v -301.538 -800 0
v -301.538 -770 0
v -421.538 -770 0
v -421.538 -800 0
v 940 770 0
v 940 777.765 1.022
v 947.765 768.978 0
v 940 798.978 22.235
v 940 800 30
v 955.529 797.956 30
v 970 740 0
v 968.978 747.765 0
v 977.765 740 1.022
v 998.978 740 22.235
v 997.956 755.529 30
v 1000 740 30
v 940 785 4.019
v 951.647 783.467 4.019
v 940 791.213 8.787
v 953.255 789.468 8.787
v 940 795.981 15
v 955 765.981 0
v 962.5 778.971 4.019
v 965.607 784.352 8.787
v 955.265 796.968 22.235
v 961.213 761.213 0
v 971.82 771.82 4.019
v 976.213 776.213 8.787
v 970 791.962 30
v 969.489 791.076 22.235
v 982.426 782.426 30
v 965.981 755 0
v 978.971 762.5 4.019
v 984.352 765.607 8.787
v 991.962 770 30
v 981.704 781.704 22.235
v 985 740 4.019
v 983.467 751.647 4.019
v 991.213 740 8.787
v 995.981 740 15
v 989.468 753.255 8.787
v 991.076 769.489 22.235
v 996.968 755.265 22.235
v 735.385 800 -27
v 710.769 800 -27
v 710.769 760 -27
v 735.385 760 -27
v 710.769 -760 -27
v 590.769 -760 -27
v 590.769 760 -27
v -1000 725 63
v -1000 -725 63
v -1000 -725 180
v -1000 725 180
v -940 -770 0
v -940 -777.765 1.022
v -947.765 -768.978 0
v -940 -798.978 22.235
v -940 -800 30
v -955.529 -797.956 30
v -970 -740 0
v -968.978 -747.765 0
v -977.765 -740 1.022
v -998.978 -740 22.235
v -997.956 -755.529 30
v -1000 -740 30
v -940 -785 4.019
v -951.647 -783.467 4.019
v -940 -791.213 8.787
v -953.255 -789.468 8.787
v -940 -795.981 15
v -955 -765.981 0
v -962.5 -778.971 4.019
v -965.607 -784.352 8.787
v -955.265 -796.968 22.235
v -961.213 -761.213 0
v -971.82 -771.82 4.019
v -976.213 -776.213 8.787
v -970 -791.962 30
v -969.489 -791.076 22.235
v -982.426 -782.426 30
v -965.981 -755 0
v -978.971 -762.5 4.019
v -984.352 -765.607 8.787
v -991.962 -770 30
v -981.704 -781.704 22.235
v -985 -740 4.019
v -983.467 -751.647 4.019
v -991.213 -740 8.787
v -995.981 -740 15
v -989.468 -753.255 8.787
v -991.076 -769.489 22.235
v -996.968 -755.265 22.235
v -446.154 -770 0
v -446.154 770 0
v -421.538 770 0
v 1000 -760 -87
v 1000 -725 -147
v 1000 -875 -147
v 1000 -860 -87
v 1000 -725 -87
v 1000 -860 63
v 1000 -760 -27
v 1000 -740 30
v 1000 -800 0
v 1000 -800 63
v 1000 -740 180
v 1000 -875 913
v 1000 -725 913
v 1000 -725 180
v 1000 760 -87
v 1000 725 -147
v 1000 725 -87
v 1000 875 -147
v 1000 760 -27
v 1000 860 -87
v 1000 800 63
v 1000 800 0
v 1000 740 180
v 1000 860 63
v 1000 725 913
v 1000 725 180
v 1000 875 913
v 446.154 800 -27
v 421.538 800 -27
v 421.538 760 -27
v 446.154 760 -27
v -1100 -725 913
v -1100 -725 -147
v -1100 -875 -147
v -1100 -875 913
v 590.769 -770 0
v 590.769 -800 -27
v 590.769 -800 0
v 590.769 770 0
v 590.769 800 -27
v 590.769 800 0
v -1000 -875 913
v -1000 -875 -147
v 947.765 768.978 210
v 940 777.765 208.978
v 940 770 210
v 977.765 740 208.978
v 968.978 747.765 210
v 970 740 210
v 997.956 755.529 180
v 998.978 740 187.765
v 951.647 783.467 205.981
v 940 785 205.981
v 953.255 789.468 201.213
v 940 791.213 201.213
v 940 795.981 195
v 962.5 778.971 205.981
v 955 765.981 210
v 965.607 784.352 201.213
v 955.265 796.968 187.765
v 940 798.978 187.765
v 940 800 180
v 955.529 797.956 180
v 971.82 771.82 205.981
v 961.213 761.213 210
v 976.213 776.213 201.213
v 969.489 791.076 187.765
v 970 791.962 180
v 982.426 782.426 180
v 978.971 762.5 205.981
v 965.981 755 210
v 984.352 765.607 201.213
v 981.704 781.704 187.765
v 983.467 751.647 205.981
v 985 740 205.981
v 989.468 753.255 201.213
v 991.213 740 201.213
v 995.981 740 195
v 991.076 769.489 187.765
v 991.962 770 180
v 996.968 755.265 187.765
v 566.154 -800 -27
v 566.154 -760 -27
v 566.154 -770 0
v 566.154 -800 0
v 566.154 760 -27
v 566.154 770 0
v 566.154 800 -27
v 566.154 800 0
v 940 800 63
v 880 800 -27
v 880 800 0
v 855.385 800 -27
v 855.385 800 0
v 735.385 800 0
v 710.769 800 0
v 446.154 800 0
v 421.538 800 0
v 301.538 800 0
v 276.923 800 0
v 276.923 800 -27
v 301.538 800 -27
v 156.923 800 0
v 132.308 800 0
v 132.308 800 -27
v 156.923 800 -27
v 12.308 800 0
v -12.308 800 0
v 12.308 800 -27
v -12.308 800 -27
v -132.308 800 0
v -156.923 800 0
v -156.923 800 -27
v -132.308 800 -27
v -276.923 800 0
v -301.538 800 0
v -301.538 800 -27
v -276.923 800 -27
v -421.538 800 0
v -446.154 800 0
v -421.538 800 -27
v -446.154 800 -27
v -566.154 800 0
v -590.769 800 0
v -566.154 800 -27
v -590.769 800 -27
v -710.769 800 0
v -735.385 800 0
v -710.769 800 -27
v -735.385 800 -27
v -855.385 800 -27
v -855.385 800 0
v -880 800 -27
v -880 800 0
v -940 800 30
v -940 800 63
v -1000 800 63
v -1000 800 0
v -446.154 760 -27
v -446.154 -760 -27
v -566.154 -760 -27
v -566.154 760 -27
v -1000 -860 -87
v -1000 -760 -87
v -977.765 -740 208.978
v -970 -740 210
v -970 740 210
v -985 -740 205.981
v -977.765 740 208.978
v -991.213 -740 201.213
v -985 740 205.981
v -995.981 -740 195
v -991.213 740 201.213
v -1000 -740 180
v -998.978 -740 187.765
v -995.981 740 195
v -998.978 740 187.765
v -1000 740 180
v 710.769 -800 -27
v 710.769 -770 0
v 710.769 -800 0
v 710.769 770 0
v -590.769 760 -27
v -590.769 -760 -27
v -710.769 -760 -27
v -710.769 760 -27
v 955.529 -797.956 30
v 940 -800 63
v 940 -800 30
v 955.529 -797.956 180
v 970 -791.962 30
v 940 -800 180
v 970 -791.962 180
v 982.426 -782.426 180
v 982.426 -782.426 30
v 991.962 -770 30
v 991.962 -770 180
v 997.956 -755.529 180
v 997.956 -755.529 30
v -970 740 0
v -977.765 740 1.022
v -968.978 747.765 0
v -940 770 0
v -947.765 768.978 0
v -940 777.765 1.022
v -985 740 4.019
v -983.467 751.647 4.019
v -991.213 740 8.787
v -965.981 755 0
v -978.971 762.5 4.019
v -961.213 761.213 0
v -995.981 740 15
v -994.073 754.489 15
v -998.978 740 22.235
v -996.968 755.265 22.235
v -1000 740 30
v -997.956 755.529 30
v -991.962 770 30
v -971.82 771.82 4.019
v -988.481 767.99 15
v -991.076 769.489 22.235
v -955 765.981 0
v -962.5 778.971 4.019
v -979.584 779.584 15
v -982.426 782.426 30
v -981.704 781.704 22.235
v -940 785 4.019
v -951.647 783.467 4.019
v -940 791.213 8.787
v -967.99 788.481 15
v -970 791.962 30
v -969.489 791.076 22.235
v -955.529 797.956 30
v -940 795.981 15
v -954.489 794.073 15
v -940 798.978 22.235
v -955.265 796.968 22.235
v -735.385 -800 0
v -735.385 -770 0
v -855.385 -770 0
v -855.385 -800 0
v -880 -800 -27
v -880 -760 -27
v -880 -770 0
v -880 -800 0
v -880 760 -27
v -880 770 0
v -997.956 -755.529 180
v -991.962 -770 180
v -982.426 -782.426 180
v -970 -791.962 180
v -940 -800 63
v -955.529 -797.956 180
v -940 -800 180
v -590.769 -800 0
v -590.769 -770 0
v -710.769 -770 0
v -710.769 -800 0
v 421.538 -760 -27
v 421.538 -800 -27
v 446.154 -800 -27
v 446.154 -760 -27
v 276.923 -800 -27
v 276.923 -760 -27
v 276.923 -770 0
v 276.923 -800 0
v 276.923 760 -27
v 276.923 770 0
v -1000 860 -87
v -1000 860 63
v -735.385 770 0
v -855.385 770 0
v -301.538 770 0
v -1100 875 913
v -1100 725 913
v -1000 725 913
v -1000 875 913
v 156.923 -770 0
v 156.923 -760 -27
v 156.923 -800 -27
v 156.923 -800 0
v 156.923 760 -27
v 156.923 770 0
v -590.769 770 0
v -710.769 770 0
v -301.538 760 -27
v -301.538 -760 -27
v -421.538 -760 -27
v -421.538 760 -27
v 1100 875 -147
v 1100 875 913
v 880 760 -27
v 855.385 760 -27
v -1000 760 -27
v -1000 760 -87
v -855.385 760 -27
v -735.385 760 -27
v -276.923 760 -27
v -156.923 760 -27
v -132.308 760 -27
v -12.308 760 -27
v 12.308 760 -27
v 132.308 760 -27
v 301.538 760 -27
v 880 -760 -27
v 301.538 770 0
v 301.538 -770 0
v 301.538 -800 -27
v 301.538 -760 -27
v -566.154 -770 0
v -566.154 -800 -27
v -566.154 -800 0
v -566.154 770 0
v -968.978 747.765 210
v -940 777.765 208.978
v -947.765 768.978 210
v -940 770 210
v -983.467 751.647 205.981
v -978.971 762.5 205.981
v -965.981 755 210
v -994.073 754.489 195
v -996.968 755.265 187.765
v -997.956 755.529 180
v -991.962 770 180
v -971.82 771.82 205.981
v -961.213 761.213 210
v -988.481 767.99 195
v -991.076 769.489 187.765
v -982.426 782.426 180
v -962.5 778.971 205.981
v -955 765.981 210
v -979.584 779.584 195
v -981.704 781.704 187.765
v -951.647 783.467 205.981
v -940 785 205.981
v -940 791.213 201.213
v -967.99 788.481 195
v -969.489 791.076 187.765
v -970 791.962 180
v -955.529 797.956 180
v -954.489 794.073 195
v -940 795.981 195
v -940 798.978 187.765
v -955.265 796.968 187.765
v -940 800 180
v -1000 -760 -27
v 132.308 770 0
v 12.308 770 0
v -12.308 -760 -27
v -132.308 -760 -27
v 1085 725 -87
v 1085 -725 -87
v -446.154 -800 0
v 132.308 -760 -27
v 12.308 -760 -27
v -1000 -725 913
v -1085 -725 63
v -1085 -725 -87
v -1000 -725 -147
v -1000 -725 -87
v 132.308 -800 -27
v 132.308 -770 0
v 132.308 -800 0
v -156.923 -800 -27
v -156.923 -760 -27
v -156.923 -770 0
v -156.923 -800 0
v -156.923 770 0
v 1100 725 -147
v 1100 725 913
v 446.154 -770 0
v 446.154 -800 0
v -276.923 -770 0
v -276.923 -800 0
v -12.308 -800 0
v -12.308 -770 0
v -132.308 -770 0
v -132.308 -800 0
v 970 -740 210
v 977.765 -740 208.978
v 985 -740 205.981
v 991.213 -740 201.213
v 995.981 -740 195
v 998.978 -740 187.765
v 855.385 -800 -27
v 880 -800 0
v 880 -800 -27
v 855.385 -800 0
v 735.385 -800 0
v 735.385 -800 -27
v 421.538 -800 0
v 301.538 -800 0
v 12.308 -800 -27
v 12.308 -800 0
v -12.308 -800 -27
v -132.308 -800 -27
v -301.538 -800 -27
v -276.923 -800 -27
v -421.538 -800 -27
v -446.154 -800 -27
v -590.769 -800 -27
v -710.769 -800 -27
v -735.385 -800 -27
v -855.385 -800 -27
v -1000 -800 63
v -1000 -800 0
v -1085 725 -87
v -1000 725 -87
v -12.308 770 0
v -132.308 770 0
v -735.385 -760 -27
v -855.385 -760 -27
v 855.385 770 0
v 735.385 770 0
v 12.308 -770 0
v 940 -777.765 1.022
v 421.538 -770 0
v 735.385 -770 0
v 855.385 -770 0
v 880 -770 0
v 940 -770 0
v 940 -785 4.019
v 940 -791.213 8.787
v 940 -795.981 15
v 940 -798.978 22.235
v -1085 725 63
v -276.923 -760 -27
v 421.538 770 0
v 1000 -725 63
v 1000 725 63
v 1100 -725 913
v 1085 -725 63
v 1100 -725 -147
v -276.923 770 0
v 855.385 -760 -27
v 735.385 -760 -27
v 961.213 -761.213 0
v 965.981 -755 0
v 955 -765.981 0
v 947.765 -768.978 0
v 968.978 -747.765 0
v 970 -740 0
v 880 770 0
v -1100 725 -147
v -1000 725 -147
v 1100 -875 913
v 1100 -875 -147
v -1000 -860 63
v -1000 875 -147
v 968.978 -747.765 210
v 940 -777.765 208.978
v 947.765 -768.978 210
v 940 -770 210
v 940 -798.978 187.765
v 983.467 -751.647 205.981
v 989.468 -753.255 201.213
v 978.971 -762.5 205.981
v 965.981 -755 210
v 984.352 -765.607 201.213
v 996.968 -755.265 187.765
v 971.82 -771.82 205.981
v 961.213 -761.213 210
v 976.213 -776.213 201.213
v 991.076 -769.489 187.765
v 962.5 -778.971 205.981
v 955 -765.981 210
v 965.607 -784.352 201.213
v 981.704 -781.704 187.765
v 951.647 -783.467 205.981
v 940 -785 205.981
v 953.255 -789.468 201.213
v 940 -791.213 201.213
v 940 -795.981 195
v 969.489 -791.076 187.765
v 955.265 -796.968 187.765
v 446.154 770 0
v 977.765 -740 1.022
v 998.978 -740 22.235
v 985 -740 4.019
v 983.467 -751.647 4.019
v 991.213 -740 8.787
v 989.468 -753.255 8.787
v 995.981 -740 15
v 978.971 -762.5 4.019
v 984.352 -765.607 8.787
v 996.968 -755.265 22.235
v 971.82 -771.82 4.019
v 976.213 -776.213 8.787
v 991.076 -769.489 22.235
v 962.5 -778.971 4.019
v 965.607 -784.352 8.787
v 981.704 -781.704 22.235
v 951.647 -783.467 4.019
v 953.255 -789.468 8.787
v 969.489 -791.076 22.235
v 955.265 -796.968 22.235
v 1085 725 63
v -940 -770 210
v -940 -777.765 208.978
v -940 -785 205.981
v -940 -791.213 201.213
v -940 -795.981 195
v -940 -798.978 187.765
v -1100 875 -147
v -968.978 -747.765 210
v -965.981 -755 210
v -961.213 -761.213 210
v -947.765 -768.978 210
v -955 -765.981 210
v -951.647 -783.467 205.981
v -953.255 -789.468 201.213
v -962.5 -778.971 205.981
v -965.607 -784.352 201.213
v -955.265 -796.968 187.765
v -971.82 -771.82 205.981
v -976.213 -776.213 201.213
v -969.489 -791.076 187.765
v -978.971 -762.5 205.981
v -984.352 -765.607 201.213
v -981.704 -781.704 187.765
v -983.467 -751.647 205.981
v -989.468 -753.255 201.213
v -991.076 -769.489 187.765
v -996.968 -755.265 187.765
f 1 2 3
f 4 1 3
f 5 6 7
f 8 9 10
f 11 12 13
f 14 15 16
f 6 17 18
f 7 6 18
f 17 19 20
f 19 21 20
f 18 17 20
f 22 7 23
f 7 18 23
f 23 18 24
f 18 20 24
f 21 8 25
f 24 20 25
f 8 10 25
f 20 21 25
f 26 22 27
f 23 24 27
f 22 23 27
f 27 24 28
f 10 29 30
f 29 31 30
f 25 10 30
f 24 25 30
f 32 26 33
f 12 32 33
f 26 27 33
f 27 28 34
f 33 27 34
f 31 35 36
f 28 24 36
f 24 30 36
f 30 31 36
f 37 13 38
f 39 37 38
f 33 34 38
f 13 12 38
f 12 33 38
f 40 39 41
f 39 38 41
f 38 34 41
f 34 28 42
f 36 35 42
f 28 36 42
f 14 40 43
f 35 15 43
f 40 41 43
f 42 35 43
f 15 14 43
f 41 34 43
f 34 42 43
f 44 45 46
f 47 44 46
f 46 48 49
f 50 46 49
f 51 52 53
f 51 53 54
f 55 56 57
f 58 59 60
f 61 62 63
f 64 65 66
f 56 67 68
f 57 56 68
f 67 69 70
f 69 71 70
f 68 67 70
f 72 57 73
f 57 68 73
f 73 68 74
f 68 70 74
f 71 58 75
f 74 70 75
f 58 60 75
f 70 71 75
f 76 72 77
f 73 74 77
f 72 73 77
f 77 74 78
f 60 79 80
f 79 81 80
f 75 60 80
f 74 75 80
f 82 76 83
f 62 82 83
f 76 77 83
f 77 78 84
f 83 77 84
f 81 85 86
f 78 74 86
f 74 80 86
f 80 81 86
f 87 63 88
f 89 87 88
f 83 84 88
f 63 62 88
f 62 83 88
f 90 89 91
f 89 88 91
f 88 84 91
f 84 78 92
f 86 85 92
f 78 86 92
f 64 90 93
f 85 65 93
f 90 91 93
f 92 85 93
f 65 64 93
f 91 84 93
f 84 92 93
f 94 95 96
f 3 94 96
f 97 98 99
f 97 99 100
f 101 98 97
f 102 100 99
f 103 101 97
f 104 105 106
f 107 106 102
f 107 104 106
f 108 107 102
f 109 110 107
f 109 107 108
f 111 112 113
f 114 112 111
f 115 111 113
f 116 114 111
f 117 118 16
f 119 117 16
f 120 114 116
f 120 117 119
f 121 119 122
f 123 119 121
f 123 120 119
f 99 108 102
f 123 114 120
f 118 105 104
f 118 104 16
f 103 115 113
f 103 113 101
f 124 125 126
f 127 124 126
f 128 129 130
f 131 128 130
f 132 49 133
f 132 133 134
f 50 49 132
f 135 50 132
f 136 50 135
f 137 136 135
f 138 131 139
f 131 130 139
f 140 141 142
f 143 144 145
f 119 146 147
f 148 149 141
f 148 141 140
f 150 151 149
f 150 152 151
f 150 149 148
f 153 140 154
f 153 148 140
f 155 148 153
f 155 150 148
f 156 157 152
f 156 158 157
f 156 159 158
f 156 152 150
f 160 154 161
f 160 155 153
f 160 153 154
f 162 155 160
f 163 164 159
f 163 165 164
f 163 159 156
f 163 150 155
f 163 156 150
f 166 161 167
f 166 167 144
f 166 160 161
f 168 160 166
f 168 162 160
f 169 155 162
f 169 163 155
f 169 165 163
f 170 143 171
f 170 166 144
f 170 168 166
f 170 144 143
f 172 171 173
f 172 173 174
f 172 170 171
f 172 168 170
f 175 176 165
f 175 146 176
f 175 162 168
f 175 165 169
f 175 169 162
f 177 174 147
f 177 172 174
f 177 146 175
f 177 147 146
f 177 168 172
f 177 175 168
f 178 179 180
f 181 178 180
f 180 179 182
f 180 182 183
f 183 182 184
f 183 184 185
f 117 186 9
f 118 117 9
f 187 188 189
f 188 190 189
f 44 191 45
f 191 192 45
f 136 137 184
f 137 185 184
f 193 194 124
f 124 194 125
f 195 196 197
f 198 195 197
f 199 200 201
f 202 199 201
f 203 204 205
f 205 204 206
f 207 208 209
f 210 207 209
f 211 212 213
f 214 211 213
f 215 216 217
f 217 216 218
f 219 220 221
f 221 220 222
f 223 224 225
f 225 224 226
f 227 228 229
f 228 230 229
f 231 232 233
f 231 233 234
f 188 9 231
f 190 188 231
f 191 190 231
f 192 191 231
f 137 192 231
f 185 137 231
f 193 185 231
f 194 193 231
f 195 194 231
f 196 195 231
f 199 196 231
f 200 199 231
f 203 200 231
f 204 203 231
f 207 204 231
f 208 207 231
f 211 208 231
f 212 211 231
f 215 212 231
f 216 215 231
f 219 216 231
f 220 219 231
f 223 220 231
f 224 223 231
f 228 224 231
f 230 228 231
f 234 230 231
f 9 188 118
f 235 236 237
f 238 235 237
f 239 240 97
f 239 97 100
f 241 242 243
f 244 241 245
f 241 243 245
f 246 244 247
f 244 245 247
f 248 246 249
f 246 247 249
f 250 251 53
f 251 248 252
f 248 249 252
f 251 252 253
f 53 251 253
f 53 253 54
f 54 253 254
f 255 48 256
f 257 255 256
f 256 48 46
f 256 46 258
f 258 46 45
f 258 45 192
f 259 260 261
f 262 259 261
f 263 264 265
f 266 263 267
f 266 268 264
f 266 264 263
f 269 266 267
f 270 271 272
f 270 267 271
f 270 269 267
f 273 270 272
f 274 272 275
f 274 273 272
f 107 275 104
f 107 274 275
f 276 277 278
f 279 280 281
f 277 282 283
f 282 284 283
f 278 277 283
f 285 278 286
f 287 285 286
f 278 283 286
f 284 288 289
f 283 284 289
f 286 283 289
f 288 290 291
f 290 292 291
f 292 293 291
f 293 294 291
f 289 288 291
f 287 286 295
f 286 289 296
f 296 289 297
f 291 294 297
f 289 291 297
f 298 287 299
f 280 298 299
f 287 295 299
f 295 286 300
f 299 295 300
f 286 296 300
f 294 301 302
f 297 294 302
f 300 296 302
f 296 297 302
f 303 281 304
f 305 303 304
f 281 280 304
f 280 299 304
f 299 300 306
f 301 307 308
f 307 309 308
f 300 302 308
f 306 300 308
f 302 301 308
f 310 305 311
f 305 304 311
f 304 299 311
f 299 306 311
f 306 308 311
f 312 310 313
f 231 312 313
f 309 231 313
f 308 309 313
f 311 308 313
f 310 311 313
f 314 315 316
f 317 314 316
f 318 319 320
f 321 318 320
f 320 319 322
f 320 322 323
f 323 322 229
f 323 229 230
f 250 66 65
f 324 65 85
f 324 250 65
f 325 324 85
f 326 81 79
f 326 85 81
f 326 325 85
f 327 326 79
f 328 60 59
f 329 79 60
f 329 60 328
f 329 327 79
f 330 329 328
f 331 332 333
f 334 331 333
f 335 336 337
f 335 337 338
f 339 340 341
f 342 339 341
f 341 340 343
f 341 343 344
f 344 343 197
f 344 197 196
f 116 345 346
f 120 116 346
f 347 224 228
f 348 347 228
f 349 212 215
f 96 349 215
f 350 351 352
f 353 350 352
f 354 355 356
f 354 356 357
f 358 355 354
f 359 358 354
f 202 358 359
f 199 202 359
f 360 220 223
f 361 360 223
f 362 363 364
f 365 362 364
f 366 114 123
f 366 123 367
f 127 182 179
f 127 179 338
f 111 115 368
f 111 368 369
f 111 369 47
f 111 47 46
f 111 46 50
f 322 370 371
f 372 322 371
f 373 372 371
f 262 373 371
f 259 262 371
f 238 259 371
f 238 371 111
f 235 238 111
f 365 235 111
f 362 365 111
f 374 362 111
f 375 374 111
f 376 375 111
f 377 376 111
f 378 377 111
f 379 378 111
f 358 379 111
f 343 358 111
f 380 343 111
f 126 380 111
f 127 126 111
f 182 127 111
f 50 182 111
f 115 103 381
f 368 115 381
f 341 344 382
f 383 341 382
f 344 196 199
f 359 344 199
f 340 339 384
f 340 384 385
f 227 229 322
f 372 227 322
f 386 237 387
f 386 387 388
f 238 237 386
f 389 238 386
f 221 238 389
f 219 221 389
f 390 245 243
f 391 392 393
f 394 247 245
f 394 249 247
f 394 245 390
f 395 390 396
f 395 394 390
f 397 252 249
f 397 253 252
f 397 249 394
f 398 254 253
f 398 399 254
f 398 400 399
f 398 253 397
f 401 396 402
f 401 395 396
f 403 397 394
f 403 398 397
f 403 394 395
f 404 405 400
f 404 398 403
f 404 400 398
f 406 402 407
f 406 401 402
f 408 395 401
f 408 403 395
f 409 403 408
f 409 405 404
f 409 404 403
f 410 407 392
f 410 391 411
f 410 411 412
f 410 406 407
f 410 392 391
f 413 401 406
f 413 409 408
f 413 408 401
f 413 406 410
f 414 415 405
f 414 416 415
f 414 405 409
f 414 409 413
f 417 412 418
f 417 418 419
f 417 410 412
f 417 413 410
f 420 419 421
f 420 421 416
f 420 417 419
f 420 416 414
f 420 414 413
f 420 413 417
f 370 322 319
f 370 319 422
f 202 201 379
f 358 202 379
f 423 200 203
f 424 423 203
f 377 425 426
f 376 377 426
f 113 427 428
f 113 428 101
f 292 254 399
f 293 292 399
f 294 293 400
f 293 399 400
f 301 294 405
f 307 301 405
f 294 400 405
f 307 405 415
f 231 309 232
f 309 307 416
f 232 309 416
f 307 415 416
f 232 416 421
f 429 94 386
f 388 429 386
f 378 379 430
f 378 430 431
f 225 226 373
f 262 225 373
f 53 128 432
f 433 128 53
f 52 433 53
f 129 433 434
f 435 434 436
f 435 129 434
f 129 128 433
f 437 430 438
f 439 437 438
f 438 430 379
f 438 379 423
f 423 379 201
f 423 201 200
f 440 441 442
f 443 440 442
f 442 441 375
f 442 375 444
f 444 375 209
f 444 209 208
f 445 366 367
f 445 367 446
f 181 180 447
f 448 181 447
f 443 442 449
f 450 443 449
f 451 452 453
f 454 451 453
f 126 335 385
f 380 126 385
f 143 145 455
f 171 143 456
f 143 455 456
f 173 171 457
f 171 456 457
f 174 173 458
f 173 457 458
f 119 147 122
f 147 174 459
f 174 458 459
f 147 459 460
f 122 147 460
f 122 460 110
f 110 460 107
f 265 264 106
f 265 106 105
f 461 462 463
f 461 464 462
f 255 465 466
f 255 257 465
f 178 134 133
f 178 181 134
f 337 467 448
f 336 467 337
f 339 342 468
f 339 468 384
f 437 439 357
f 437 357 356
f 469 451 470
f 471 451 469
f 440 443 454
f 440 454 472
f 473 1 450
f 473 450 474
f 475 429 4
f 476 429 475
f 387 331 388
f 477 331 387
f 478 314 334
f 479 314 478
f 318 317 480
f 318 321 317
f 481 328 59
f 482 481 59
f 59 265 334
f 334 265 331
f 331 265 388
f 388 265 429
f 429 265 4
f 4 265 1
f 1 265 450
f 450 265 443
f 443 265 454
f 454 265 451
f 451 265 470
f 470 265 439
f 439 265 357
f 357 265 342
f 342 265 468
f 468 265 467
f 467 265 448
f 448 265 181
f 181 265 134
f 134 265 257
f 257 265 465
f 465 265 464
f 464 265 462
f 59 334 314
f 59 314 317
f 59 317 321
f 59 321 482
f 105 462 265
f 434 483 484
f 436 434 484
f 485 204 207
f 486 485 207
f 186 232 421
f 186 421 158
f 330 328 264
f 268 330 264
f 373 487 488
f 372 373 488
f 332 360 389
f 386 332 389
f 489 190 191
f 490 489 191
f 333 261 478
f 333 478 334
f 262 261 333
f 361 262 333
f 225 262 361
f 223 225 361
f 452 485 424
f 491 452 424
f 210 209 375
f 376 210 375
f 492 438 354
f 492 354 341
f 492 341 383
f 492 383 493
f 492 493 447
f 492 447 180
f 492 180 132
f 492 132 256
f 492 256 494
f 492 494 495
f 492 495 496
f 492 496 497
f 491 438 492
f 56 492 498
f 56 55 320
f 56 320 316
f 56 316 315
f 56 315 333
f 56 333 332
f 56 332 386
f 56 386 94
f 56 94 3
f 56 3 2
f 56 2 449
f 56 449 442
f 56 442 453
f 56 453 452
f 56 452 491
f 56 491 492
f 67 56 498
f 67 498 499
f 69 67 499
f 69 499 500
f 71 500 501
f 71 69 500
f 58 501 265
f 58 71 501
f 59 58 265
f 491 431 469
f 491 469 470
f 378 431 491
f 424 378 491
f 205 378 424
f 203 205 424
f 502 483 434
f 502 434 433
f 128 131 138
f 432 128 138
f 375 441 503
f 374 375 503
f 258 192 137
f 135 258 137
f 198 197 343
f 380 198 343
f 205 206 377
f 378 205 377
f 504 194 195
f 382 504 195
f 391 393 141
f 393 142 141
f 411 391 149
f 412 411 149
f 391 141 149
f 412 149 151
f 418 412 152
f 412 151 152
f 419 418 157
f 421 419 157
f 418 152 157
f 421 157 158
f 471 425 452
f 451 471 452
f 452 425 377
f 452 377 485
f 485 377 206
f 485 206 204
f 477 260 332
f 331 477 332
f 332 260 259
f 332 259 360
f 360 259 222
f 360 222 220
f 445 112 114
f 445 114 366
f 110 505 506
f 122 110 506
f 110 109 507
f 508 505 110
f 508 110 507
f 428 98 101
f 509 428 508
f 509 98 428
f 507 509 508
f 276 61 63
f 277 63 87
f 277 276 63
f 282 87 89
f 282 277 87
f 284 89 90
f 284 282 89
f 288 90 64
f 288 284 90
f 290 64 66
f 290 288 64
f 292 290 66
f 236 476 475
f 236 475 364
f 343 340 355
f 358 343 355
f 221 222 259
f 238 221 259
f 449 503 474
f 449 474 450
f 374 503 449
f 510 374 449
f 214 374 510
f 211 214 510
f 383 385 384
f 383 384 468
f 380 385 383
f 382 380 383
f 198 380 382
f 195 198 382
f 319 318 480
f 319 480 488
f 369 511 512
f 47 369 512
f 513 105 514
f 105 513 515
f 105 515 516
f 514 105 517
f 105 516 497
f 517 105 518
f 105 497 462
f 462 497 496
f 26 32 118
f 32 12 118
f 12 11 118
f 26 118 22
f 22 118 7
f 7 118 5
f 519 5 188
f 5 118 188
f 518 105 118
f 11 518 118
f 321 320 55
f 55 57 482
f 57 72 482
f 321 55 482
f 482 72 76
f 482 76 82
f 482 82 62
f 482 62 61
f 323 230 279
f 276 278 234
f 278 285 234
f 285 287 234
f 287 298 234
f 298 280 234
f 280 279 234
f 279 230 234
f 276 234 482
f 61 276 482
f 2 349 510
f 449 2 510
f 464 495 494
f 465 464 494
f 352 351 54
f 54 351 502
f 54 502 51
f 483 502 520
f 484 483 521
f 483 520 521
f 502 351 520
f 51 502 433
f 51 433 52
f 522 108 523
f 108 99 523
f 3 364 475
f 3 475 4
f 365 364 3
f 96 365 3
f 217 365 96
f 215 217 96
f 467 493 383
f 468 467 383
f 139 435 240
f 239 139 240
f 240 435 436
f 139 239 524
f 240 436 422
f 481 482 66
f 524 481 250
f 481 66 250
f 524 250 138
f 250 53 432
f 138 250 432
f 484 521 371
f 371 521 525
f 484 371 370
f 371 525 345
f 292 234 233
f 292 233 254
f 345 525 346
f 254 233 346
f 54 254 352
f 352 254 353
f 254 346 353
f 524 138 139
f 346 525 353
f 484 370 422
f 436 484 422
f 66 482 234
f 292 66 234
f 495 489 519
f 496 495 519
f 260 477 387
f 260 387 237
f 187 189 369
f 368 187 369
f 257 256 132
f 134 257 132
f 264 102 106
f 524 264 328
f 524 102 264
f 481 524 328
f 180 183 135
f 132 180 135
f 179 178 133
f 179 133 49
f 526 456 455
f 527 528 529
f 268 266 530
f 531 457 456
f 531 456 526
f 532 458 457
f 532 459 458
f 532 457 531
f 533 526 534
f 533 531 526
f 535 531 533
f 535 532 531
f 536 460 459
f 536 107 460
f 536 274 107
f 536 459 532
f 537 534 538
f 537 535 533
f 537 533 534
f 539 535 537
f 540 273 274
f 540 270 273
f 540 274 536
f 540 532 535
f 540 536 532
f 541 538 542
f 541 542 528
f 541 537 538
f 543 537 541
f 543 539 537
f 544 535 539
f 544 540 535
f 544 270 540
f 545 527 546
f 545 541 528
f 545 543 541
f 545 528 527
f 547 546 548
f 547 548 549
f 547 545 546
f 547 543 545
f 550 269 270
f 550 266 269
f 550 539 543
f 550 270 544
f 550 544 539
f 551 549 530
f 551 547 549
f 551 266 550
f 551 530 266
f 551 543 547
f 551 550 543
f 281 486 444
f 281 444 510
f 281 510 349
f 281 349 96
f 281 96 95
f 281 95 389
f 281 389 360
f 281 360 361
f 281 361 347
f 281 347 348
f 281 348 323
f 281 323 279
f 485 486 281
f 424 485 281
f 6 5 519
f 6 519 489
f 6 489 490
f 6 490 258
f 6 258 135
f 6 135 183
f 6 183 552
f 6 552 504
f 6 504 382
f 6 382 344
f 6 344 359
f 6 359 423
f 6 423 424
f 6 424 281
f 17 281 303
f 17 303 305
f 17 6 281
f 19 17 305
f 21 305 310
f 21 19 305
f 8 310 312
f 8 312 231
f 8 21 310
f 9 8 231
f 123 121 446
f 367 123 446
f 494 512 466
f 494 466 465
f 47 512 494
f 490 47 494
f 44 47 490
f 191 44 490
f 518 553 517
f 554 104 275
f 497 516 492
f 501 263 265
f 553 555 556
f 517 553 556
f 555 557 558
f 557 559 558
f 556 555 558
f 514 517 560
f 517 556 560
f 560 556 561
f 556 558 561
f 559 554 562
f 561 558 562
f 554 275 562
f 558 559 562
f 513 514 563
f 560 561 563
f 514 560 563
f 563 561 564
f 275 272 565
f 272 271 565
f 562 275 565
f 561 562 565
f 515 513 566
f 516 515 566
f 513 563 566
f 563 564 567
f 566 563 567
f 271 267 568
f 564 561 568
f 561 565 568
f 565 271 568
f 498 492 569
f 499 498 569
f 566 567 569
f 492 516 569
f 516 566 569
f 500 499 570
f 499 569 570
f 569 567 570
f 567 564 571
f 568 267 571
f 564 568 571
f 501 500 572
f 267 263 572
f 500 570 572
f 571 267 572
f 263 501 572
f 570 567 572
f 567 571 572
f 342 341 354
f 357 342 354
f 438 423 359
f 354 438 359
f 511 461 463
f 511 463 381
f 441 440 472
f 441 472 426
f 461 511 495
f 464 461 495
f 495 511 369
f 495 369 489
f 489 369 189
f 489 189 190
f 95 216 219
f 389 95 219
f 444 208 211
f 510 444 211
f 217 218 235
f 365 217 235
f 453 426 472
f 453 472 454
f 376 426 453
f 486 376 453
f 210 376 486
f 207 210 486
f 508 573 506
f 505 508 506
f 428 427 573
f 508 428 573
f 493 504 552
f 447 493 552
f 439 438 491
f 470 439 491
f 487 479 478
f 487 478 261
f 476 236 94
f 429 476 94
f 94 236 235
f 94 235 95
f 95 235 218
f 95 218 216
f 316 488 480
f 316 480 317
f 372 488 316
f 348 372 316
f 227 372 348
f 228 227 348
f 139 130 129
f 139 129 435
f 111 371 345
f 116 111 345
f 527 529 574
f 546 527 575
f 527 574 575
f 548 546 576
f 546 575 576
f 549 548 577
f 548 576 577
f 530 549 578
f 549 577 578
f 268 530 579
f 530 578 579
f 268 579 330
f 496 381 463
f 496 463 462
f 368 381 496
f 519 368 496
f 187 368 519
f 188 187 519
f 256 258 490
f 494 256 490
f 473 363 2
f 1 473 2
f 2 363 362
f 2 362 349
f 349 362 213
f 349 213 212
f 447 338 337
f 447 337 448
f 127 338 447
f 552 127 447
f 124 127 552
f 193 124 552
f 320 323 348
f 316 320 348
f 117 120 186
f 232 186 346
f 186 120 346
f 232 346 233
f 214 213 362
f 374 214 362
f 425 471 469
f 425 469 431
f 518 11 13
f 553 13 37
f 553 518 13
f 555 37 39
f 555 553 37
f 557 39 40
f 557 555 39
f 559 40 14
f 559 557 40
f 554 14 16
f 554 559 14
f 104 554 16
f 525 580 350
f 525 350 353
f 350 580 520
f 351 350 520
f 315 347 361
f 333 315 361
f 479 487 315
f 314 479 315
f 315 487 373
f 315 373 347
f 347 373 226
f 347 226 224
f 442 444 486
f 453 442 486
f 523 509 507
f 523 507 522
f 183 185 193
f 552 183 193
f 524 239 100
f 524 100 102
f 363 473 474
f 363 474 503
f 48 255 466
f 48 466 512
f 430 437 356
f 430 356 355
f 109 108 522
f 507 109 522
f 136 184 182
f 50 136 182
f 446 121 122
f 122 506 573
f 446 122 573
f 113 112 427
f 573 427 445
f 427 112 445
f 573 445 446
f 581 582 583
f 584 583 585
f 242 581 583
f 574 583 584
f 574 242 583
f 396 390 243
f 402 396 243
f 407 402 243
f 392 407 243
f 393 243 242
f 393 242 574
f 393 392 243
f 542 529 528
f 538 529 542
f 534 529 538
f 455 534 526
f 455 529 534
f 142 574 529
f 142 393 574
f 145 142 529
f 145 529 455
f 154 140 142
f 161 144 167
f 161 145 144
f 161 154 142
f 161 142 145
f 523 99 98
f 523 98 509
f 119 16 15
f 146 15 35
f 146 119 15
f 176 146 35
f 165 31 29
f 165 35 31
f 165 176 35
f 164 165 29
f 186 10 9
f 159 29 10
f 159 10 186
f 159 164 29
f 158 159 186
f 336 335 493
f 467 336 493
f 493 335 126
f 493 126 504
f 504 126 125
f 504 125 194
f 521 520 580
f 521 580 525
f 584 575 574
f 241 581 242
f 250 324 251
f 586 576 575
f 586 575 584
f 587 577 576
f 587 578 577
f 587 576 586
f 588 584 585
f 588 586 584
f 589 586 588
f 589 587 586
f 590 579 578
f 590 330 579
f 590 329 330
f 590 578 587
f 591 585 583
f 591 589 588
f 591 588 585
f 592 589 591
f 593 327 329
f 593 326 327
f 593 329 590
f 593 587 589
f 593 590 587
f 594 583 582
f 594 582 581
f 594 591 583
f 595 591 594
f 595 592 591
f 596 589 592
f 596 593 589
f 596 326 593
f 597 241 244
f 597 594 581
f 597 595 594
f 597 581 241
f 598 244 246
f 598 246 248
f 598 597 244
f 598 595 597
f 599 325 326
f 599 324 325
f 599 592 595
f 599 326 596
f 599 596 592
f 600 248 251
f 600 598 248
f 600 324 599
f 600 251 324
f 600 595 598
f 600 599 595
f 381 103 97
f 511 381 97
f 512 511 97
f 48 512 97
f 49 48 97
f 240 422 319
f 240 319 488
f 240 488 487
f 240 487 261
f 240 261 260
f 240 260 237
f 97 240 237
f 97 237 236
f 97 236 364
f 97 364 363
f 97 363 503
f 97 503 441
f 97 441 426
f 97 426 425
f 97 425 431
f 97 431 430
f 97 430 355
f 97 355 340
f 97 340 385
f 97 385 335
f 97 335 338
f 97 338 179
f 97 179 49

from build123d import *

# Parameters (mm, degrees)
SKETCH_W            = 2000
SKETCH_H            = 1600
PAD_DEPTH           = 210
FILLET_R            = 60
FILLET001_R         = 30
FILLET002_R         = 30
SKETCH001_W         = 120
SKETCH001_H         = 27
PAD001_DEPTH        = 1600
LINEARPATTERN_COUNT = 14
LINEARPATTERN_PITCH = 144.615385
PAD002_DEPTH        = 2000
SKETCH003_W         = 100
SKETCH003_H         = 150
PAD003_DEPTH        = 60
PAD003_DEPTH_BACK   = 1000
SKETCH004_W         = 85
SKETCH004_H         = 150
PAD004_DEPTH        = 1450


with BuildPart() as part:
    # Sketch → Pad (new body)
    with BuildSketch(Plane.XY):
        Rectangle(SKETCH_W, SKETCH_H)
    extrude(amount=PAD_DEPTH)

    # Fillet
    fillet_edges = [part.edges().sort_by_distance(p)[0] for p in [
        (1000, 800, 105),
        (1000, -800, 105),
        (-1000, -800, 105),
        (-1000, 800, 105),
    ]]
    fillet(fillet_edges, radius=FILLET_R)

    # Fillet001
    fillet001_edges = [part.edges().sort_by_distance(p)[0] for p in [
        (0, 800, 210),
    ]]
    fillet(fillet001_edges, radius=FILLET001_R)

    # Fillet002
    fillet002_edges = [part.edges().sort_by_distance(p)[0] for p in [
        (0, 800, 0),
    ]]
    fillet(fillet002_edges, radius=FILLET002_R)

    # Sketch001 (on Face1 of Fillet002) → Pad001 (join)
    with BuildSketch(Plane(origin=(0, 800, 0), x_dir=(-1, 0, 0), z_dir=(0, 1, 0))):
        with Locations((-940, -13.5)):
            Rectangle(SKETCH001_W, SKETCH001_H)
    pad001 = extrude(amount=-PAD001_DEPTH)

    # LinearPattern: Pad001 ×14
    with Locations(*[(-i * LINEARPATTERN_PITCH, 0, 0) for i in range(1, LINEARPATTERN_COUNT)]):
        add(pad001)

    # Sketch002 (on Face8 of LinearPattern) → Pad002 (join)
    with BuildSketch(Plane(origin=(-1000, 0, 0), x_dir=(0, -1, 0), z_dir=(-1, 0, 0))):
        Polygon((-860, 63), (-800, 63), (-800, -27), (-760, -27), (-760, -87), (-860, -87), align=None)
    pad002 = extrude(amount=-PAD002_DEPTH)

    # Mirrored: Pad002 across Sketch002 V_Axis
    add(pad002.mirror(Plane(origin=(-1000, 0, 0), x_dir=(-1, 0, 0), z_dir=(0, -1, 0))))

    # Sketch003 (on Face146 of Mirrored) → Pad003 (join, two sides)
    with BuildSketch(Plane(origin=(0, 0, -87), x_dir=(1, 0, 0), z_dir=(0, 0, -1))) as pad003_sk:
        with Locations((-1050, 800)):
            Rectangle(SKETCH003_W, SKETCH003_H)
        with Locations((1050, 800)):
            Rectangle(SKETCH003_W, SKETCH003_H)
        with Locations((1050, -800)):
            Rectangle(SKETCH003_W, SKETCH003_H)
        with Locations((-1050, -800)):
            Rectangle(SKETCH003_W, SKETCH003_H)
    extrude(amount=PAD003_DEPTH)
    extrude(pad003_sk.sketch, amount=-PAD003_DEPTH_BACK)

    # Sketch004 (on Face55 of Pad003) → Pad004 (join)
    with BuildSketch(Plane.XZ.offset(-725)):
        with Locations((-1042.5, -12)):
            Rectangle(SKETCH004_W, SKETCH004_H)
    pad004 = extrude(amount=PAD004_DEPTH)

    # Mirrored001: Pad004 across Sketch004 V_Axis
    add(pad004.mirror(Plane(origin=(0, 725, 0), x_dir=(0, -1, 0), z_dir=(1, 0, 0))))


solid = part.part
